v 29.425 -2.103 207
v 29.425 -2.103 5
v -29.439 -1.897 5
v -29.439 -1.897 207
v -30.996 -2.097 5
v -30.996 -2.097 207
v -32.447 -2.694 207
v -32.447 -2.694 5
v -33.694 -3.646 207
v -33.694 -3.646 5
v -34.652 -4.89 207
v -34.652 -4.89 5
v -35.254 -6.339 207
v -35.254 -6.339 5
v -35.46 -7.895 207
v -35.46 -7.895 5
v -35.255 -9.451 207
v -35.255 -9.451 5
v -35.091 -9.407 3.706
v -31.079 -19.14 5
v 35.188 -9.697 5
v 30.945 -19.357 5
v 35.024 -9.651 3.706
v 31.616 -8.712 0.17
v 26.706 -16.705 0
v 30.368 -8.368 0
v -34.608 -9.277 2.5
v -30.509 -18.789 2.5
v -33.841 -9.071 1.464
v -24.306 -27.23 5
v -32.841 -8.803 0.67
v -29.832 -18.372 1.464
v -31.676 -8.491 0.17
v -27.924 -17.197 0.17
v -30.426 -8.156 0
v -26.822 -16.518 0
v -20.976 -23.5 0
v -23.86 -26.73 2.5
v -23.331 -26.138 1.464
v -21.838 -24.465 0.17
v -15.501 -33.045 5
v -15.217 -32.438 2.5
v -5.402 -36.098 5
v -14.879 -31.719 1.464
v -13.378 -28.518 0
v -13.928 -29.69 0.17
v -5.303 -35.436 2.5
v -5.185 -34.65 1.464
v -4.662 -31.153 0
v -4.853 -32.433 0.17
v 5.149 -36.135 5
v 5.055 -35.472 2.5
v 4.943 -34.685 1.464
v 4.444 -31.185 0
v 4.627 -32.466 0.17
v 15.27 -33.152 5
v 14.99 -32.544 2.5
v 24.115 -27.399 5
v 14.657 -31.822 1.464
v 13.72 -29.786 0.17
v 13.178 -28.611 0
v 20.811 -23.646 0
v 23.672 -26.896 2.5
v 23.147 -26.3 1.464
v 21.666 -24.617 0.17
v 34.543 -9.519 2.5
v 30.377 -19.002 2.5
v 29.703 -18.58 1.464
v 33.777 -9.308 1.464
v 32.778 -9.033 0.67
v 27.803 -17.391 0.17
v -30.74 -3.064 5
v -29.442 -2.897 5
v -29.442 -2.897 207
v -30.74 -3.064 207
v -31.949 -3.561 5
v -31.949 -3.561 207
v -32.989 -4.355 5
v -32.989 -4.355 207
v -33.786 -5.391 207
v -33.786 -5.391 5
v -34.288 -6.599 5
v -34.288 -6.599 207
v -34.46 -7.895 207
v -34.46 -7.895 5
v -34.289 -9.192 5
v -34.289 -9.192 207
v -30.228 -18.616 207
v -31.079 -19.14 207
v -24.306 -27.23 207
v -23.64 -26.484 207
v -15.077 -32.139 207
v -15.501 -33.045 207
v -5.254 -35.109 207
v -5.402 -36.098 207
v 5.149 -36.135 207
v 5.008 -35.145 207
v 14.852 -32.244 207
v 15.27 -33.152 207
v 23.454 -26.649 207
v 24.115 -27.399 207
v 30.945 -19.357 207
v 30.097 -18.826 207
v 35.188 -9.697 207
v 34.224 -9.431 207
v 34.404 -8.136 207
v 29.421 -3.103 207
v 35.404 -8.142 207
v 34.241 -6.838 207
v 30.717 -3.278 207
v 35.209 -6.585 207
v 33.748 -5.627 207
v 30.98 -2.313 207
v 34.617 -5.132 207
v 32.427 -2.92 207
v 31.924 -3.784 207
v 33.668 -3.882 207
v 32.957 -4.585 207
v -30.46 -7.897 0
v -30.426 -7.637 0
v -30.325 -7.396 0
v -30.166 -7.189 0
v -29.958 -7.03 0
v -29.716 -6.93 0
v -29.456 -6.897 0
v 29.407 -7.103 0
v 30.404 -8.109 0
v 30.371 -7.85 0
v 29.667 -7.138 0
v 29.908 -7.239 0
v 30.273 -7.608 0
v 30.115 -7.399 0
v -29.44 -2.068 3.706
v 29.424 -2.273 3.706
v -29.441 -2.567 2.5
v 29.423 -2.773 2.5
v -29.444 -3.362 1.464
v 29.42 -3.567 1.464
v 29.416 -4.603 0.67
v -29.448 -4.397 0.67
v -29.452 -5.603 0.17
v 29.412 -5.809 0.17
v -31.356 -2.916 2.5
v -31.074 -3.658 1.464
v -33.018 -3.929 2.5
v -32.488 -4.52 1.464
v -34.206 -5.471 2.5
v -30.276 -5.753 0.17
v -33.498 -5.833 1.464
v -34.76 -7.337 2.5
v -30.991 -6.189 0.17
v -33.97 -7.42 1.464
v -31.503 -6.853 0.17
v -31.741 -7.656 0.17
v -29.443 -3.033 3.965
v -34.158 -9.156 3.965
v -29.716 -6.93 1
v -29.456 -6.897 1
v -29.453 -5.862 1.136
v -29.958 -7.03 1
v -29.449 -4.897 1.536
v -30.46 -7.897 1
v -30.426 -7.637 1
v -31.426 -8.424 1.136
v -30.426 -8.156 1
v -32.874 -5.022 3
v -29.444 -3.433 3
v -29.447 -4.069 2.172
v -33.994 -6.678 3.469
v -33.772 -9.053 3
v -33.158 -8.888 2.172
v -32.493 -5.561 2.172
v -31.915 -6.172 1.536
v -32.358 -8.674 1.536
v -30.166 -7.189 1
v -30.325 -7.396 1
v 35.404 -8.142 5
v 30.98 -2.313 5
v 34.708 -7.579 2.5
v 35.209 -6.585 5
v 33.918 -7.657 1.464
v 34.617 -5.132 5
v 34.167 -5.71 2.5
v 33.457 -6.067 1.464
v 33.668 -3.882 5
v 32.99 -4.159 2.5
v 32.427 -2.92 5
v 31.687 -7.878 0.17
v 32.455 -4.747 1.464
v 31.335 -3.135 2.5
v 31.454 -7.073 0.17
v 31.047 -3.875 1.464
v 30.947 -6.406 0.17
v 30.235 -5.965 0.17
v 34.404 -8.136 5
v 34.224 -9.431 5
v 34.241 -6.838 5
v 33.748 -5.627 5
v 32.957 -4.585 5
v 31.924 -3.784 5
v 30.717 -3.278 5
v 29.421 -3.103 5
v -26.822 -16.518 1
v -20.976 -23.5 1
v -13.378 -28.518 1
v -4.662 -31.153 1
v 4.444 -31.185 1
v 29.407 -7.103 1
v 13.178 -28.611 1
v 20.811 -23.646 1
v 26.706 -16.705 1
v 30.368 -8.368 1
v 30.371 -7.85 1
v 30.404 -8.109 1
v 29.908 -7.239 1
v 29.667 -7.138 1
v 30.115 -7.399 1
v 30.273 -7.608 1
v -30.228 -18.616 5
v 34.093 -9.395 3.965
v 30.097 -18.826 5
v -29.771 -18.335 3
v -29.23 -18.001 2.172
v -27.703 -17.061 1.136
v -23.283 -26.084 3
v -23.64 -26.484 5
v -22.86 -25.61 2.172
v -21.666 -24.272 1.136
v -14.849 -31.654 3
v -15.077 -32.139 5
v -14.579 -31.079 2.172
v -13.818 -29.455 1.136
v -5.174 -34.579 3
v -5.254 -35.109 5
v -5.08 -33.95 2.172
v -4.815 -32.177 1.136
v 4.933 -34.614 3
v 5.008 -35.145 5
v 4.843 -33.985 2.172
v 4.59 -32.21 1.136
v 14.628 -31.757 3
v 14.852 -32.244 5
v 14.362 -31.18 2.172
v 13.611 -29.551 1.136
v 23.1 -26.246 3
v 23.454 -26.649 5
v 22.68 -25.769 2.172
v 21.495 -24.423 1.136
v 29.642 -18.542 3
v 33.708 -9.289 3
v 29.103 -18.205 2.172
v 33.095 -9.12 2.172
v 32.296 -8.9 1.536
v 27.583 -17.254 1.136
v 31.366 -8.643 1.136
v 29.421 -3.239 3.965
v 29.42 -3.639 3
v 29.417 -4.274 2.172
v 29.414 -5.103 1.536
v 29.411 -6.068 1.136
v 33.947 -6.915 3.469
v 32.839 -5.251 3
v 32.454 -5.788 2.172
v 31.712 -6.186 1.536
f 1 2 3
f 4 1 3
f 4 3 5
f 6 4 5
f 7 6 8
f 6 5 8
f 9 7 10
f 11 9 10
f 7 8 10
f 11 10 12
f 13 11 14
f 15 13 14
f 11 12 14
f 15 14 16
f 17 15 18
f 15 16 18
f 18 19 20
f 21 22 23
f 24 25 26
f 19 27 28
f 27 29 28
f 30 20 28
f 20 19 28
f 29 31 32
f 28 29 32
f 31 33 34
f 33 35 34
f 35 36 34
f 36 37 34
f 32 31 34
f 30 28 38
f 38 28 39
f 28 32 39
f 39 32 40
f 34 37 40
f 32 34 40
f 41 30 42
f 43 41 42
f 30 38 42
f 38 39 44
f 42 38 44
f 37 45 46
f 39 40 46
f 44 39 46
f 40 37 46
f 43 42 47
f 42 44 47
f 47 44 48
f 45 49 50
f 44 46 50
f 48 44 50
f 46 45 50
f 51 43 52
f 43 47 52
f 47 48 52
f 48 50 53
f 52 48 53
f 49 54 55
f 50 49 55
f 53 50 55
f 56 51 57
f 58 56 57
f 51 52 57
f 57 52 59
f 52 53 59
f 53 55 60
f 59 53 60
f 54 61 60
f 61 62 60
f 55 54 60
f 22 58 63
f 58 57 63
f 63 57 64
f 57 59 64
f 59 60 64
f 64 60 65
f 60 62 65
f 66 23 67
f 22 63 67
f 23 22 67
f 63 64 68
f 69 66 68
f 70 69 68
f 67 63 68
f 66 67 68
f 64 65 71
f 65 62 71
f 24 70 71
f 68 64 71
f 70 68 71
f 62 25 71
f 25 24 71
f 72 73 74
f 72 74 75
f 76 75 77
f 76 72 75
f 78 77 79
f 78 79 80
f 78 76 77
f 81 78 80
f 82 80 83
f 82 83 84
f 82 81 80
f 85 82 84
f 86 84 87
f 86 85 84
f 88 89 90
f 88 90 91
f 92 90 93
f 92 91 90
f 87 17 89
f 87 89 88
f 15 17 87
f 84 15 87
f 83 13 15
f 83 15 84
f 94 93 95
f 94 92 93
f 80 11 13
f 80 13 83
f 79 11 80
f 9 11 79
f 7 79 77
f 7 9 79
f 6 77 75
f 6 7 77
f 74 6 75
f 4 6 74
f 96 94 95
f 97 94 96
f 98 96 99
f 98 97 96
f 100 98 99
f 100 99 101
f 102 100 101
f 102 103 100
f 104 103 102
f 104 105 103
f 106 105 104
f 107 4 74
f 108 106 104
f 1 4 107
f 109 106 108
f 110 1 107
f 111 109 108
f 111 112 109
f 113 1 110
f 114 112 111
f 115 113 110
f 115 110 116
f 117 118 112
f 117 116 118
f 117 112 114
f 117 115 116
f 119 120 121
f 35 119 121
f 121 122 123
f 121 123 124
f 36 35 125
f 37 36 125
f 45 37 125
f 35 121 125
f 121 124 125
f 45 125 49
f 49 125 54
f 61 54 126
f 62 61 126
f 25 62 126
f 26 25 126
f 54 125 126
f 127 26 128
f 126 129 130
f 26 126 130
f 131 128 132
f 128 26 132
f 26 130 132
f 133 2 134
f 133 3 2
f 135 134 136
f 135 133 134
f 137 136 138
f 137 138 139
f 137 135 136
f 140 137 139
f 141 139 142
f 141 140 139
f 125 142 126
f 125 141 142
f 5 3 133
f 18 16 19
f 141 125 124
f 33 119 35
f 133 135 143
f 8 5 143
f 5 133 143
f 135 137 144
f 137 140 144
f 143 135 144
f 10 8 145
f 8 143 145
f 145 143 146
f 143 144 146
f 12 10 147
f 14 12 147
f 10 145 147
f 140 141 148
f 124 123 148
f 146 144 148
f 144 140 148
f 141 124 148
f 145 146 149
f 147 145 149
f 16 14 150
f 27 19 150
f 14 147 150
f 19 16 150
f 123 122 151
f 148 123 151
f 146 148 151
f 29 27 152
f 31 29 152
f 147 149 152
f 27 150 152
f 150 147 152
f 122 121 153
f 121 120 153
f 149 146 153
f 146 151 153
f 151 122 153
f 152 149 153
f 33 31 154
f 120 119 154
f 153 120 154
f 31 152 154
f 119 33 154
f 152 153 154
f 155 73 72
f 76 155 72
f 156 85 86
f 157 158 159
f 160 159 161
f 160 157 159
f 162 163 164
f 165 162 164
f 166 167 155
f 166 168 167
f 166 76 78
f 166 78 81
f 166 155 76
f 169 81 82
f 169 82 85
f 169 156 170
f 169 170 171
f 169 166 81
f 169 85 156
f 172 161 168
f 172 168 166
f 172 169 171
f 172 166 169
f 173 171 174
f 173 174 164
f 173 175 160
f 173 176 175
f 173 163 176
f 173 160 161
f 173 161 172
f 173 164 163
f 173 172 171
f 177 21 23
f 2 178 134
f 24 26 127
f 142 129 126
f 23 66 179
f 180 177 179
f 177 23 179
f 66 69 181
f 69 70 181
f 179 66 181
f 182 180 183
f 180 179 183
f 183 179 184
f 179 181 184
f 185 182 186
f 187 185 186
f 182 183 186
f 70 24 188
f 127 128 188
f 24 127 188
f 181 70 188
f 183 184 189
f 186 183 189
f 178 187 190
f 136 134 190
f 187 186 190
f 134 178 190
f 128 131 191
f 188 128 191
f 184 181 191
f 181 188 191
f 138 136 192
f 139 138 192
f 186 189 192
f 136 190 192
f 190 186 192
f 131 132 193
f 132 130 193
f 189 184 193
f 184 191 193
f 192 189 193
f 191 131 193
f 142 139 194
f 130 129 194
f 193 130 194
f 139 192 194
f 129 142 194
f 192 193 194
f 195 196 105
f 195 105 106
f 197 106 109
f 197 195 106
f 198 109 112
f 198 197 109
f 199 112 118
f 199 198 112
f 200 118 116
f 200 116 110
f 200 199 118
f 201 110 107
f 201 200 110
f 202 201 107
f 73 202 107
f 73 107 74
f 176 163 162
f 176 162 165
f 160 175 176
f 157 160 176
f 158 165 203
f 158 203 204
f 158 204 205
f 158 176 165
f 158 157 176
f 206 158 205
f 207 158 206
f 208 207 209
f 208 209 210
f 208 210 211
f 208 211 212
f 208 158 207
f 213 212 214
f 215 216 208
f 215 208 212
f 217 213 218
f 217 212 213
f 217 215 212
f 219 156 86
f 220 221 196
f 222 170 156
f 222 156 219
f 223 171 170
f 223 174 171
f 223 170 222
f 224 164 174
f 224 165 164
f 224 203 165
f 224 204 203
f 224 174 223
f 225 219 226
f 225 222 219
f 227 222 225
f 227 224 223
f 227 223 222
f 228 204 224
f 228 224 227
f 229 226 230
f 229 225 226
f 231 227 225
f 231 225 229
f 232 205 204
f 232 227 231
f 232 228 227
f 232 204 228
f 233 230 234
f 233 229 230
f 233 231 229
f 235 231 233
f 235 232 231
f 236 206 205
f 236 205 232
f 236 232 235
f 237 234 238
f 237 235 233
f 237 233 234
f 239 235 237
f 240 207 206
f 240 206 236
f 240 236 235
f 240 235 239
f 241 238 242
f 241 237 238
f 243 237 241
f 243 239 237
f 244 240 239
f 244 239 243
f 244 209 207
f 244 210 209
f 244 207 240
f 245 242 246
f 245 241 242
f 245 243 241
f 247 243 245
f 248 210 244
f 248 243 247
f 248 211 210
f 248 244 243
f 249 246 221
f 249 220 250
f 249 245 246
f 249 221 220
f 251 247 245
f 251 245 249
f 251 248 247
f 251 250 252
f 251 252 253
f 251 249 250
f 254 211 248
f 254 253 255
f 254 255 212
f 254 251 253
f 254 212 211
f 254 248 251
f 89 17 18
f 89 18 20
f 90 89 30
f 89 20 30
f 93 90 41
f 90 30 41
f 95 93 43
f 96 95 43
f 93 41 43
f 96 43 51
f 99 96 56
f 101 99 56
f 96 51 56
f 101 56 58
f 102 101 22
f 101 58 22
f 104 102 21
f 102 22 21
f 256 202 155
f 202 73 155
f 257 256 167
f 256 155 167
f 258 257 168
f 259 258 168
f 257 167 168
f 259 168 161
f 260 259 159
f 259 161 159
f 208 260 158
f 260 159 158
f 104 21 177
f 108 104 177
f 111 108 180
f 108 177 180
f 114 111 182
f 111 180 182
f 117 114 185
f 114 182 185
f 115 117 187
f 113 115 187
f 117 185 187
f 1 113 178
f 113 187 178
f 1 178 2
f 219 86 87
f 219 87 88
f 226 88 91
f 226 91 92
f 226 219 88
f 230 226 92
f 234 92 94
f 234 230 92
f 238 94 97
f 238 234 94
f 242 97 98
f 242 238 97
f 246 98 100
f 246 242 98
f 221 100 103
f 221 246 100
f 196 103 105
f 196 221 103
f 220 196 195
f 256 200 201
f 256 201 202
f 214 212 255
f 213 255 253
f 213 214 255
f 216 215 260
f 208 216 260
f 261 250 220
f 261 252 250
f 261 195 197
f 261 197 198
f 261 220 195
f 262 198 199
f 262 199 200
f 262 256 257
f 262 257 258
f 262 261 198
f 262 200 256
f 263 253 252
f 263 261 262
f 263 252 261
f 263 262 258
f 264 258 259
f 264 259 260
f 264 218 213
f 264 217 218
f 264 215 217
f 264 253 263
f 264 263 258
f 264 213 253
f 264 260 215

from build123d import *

# Parameters (mm, degrees)
F1_DEPTH = 207
F2_R     = 5
F3_T     = -1


with BuildPart() as f1:
    # F0 (on Top) → F1 (new body)
    with BuildSketch(Plane.XY):
        with BuildLine():
            ThreePointArc((-29.4389327221, -1.8971663562), (-34.2138220516, -4.2365060198), (-35.2552827265, -9.450663462))
            ThreePointArc((-35.2552827265, -9.450663462), (-0.1275131337, -36.4997772651), (35.1883905908, -9.696760677))
            ThreePointArc((35.1883905908, -9.696760677), (34.1833865425, -4.4754538451), (29.4249586801, -2.1028092345))
            Line((29.4249586801, -2.1028092345), (-29.4389327221, -1.8971663562))
        make_face()
    extrude(amount=F1_DEPTH)

    # F2
    f2_edges = [f1.edges().sort_by_distance(p)[0] for p in [
        (-0.127513, -36.499777, 0),
    ]]
    fillet(f2_edges, radius=F2_R)

    # F3
    f3_openings = [f1.faces().sort_by_distance(p)[0] for p in [
        (-0.058469, -16.736236, 207),
    ]]
    offset(amount=F3_T, openings=f3_openings)


solid = f1.part
